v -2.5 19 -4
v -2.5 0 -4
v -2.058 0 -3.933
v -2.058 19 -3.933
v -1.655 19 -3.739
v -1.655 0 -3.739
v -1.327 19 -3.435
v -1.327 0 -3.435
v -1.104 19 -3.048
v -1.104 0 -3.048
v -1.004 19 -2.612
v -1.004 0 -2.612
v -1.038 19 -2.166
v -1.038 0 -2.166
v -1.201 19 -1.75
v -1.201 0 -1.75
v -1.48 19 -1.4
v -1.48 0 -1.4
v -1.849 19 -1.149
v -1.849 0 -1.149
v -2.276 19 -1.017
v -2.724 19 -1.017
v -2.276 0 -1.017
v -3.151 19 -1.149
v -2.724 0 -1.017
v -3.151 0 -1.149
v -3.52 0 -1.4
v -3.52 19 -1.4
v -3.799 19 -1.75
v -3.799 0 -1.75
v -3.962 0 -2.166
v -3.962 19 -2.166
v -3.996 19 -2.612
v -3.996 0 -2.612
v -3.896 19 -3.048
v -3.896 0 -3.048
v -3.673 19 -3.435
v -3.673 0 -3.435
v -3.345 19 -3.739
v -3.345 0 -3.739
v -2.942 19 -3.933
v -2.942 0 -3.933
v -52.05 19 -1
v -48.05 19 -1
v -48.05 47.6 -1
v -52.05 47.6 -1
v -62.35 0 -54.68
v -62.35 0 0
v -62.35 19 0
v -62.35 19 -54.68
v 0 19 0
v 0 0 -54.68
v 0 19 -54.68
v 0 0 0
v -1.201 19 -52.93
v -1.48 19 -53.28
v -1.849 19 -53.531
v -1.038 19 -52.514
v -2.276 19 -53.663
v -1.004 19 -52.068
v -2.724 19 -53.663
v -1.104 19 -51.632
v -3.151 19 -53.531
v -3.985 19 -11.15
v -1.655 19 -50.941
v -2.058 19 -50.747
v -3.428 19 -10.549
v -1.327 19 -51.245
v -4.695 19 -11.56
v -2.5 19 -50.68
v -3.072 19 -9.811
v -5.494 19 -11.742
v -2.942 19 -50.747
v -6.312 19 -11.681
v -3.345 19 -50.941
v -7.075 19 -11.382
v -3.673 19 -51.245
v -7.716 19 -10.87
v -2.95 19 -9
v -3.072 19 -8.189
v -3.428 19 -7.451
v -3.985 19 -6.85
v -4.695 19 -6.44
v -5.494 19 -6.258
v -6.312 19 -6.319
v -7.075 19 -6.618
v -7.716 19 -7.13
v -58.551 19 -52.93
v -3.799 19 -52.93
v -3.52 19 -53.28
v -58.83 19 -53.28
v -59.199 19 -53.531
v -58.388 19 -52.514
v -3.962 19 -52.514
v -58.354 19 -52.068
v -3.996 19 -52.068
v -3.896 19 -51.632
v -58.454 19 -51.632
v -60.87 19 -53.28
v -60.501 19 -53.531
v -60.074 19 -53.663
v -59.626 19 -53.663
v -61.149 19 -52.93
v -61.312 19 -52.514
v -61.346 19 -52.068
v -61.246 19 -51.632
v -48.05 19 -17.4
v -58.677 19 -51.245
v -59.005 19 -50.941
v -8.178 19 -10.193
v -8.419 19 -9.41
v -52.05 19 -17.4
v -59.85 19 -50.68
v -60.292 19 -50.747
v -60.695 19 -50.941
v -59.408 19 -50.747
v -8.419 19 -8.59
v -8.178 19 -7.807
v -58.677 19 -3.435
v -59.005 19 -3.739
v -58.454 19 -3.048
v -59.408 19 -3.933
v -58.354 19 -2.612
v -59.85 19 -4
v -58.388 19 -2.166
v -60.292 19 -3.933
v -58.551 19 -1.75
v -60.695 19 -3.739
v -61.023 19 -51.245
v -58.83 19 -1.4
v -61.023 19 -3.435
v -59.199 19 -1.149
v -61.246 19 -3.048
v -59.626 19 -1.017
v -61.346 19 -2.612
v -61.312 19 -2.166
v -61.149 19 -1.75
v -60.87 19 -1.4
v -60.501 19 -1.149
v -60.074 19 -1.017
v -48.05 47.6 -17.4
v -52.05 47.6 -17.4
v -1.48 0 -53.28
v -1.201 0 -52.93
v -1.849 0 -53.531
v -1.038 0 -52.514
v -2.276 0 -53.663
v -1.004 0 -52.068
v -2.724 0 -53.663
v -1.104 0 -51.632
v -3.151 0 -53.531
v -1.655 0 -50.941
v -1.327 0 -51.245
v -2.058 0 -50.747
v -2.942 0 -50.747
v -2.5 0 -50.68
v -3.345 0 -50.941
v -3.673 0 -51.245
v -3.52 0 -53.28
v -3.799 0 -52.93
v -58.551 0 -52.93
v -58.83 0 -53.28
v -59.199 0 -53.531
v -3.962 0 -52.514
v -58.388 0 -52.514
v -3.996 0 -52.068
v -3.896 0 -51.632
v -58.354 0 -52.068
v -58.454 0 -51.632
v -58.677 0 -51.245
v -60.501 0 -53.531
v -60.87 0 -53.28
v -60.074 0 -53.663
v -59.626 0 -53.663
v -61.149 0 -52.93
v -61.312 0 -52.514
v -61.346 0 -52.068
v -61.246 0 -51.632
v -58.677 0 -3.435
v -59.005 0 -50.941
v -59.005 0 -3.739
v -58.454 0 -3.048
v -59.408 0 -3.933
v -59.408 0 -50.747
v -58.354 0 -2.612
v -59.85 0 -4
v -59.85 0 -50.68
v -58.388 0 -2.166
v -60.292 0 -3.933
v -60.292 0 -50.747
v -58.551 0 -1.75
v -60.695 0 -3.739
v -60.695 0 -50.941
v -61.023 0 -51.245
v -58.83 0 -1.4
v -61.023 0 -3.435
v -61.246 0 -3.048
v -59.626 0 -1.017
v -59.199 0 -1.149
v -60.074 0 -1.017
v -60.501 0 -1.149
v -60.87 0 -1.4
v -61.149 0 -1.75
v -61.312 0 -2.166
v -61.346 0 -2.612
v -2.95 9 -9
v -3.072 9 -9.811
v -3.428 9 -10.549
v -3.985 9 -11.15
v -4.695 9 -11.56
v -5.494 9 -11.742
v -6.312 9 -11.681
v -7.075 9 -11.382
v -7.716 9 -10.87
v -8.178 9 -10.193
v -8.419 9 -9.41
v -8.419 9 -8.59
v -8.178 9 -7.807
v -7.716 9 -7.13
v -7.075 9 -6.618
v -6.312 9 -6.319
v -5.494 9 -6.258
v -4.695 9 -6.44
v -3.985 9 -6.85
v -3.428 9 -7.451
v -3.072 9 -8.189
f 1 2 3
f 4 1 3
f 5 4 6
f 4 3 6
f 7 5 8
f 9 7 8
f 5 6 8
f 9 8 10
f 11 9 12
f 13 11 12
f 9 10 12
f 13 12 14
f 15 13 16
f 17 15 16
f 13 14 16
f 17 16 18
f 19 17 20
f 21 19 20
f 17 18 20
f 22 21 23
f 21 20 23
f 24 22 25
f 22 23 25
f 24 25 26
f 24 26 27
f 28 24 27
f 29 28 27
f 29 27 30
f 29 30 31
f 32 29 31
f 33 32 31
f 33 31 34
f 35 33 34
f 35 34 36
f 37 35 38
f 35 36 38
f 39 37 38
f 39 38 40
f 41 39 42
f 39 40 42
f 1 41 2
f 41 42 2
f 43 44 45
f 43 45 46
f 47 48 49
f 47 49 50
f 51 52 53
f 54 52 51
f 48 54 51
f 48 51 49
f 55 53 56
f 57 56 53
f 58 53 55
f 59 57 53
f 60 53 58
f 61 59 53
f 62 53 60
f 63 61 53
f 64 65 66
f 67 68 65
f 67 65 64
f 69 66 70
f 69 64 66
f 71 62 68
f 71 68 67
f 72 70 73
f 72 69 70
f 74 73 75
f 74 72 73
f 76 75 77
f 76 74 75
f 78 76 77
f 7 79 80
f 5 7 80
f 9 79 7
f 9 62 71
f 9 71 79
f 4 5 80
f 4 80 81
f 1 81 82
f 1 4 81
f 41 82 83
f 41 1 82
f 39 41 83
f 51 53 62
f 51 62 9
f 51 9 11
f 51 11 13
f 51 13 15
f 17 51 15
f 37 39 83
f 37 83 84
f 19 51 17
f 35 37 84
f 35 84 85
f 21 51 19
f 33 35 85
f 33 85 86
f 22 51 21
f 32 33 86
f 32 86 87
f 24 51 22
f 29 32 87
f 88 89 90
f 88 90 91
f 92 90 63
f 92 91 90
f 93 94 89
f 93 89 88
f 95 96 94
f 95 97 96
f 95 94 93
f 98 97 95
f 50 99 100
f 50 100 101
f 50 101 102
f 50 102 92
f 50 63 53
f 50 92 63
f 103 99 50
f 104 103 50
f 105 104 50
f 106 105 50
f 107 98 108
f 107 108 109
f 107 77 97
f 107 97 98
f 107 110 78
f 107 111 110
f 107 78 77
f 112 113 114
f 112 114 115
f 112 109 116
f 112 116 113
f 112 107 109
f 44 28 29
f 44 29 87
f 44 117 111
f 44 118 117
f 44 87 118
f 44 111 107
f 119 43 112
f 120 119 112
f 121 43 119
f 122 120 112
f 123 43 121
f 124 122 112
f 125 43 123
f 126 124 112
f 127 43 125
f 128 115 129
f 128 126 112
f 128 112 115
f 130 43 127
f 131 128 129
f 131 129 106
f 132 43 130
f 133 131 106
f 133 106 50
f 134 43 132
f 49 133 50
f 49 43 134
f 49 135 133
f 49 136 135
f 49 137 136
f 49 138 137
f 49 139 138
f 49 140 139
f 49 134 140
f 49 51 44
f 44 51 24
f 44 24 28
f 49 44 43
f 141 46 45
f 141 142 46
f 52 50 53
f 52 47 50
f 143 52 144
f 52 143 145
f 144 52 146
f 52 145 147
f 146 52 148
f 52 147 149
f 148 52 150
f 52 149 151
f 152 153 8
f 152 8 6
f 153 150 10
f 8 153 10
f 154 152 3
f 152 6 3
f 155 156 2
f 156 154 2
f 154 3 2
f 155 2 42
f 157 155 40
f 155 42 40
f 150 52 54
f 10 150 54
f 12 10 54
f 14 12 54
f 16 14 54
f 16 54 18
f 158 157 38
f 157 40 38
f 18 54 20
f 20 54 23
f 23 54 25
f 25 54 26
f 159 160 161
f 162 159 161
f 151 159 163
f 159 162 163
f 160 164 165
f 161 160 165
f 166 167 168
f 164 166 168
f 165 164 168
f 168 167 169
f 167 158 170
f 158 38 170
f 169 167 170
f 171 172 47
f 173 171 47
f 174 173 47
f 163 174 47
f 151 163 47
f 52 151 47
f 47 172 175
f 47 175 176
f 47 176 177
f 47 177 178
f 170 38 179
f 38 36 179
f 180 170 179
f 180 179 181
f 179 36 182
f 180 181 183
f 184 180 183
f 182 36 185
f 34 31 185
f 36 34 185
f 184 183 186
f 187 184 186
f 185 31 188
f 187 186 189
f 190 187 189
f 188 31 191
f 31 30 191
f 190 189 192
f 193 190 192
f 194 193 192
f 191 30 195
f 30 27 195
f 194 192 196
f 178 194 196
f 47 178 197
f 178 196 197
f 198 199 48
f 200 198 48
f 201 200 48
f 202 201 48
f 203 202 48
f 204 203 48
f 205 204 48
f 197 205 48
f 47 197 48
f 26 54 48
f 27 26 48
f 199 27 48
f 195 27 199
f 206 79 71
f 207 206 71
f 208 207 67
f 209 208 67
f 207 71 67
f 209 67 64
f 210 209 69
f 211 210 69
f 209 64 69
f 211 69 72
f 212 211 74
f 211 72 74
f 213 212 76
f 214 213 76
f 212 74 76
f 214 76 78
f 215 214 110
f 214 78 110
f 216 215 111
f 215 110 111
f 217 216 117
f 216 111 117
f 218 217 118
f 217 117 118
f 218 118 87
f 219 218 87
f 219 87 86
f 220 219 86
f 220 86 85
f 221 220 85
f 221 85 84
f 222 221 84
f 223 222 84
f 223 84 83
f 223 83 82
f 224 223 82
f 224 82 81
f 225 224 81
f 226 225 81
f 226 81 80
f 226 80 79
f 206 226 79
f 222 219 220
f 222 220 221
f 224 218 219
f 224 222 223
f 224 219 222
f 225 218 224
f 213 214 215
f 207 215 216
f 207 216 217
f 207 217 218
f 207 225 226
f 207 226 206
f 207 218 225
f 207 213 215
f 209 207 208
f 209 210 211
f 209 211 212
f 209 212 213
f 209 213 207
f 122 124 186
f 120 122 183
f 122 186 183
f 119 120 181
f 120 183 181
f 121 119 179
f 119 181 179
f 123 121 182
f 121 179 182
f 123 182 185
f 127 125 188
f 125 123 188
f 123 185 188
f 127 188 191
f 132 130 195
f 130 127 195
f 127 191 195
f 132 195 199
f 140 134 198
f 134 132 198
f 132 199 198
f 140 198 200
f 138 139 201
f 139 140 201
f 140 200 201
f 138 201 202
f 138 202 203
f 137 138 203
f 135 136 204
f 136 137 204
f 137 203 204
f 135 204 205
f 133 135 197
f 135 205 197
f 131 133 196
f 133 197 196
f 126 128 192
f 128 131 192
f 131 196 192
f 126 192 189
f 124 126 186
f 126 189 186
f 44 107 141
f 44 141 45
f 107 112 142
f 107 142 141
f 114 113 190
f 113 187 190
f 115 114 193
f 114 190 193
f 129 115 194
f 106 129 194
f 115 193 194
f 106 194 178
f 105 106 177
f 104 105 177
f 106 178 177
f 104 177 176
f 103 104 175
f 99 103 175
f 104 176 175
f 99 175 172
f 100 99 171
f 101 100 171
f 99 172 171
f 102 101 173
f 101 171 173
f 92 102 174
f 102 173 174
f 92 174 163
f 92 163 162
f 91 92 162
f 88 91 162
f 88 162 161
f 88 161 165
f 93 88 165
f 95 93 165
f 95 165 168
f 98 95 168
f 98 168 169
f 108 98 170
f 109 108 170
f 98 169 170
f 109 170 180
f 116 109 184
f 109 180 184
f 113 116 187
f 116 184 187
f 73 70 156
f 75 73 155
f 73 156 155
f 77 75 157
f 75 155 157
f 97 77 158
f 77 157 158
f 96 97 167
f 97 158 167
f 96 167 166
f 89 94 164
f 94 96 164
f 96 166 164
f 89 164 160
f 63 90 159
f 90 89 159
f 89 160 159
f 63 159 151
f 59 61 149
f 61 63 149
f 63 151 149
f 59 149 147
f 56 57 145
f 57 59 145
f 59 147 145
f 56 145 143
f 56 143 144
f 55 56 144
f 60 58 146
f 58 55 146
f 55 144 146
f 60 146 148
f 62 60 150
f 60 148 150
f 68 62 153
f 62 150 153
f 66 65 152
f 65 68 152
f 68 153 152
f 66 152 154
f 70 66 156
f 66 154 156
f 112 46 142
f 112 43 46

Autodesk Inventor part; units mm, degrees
ref_plane "YZ Plane" through (0, 0, 0) normal (1, 0, 0) x (0, 1, 0)
ref_plane "XZ Plane" through (0, 0, 0) normal (0, 1, 0) x (-1, 0, 0)
ref_plane "XY Plane" through (0, 0, 0) normal (0, 0, 1) x (1, 0, 0)
sketch "Sketch1" plane through (0, 0, 0) normal (0, 1, 0) x (-1, 0, 0)
  line L0 (0, 0) -> (62.35, 0)
  line L1 (62.35, 0) -> (62.35, -54.68)
  line L2 (62.35, -54.68) -> (0, -54.68)
  line L3 (0, -54.68) -> (0, 0)
  dimension "d0" = 54.68
  dimension "d1" = 62.35
extrude "Extrusion1" add sketch "Sketch1" along normal blind 19
sketch "Sketch2" plane through (0, 19, 0) normal (0, 1, 0) x (1, 0, 0)
  line L0 (-62.35, 54.68) -> (-62.35, 0) projected
  line L1 (0, 54.68) -> (-62.35, 54.68) projected
  point P0 (0, 0)
  point P1 (-59.85, 52.18)
  dimension "d4" = 2.5
  dimension "d5" = 2.5
hole "Hole1" at (-59.85, 19, -52.18) direction (0, -1, 0) diameter 3 end through all
ref_plane "Work Plane1" through (-62.35, 0, -27.34) normal (0, 0, 1) x (1, 0, 0)
ref_plane "Work Plane2" through (-31.175, 0, 0) normal (1, 0, 0) x (0, 0, -1)
mirror "Mirror1" about plane through (-62.35, 0, -27.34) normal (0, 0, 1) of "Hole1"
mirror "Mirror2" about plane through (-31.175, 0, 0) normal (1, 0, 0) of "Hole1", "Mirror1"
sketch "Sketch3" plane through (0, 19, 0) normal (0, 1, 0) x (1, 0, 0)
  line L0 (-48.05, 1) -> (-52.05, 1)
  line L1 (-52.05, 1) -> (-52.05, 17.4)
  line L2 (-52.05, 17.4) -> (-48.05, 17.4)
  line L3 (-48.05, 17.4) -> (-48.05, 1)
  line L4 (-62.35, 0) -> (0, 0) projected
  line L5 (-62.35, 54.68) -> (-62.35, 0) projected
  dimension "d13" = 4
  dimension "d14" = 16.4
  dimension "d15" = 1
  dimension "d16" = 10.3
extrude "Extrusion2" add sketch "Sketch3" along normal blind 28.6
sketch "Sketch4" plane through (0, 19, 0) normal (0, 1, 0) x (1, 0, 0)
  circle A0 centre (-5.7, 9) radius 2.75
  line L0 (-62.35, 0) -> (0, 0) projected
  line L1 (0, 0) -> (0, 54.68) projected
  dimension "d19" = 5.5
  dimension "d20" = 9
  dimension "d21" = 5.7
extrude "Extrusion3" cut sketch "Sketch4" against normal blind 10
equation "\"d5\" = d4"
properties part number "board"
